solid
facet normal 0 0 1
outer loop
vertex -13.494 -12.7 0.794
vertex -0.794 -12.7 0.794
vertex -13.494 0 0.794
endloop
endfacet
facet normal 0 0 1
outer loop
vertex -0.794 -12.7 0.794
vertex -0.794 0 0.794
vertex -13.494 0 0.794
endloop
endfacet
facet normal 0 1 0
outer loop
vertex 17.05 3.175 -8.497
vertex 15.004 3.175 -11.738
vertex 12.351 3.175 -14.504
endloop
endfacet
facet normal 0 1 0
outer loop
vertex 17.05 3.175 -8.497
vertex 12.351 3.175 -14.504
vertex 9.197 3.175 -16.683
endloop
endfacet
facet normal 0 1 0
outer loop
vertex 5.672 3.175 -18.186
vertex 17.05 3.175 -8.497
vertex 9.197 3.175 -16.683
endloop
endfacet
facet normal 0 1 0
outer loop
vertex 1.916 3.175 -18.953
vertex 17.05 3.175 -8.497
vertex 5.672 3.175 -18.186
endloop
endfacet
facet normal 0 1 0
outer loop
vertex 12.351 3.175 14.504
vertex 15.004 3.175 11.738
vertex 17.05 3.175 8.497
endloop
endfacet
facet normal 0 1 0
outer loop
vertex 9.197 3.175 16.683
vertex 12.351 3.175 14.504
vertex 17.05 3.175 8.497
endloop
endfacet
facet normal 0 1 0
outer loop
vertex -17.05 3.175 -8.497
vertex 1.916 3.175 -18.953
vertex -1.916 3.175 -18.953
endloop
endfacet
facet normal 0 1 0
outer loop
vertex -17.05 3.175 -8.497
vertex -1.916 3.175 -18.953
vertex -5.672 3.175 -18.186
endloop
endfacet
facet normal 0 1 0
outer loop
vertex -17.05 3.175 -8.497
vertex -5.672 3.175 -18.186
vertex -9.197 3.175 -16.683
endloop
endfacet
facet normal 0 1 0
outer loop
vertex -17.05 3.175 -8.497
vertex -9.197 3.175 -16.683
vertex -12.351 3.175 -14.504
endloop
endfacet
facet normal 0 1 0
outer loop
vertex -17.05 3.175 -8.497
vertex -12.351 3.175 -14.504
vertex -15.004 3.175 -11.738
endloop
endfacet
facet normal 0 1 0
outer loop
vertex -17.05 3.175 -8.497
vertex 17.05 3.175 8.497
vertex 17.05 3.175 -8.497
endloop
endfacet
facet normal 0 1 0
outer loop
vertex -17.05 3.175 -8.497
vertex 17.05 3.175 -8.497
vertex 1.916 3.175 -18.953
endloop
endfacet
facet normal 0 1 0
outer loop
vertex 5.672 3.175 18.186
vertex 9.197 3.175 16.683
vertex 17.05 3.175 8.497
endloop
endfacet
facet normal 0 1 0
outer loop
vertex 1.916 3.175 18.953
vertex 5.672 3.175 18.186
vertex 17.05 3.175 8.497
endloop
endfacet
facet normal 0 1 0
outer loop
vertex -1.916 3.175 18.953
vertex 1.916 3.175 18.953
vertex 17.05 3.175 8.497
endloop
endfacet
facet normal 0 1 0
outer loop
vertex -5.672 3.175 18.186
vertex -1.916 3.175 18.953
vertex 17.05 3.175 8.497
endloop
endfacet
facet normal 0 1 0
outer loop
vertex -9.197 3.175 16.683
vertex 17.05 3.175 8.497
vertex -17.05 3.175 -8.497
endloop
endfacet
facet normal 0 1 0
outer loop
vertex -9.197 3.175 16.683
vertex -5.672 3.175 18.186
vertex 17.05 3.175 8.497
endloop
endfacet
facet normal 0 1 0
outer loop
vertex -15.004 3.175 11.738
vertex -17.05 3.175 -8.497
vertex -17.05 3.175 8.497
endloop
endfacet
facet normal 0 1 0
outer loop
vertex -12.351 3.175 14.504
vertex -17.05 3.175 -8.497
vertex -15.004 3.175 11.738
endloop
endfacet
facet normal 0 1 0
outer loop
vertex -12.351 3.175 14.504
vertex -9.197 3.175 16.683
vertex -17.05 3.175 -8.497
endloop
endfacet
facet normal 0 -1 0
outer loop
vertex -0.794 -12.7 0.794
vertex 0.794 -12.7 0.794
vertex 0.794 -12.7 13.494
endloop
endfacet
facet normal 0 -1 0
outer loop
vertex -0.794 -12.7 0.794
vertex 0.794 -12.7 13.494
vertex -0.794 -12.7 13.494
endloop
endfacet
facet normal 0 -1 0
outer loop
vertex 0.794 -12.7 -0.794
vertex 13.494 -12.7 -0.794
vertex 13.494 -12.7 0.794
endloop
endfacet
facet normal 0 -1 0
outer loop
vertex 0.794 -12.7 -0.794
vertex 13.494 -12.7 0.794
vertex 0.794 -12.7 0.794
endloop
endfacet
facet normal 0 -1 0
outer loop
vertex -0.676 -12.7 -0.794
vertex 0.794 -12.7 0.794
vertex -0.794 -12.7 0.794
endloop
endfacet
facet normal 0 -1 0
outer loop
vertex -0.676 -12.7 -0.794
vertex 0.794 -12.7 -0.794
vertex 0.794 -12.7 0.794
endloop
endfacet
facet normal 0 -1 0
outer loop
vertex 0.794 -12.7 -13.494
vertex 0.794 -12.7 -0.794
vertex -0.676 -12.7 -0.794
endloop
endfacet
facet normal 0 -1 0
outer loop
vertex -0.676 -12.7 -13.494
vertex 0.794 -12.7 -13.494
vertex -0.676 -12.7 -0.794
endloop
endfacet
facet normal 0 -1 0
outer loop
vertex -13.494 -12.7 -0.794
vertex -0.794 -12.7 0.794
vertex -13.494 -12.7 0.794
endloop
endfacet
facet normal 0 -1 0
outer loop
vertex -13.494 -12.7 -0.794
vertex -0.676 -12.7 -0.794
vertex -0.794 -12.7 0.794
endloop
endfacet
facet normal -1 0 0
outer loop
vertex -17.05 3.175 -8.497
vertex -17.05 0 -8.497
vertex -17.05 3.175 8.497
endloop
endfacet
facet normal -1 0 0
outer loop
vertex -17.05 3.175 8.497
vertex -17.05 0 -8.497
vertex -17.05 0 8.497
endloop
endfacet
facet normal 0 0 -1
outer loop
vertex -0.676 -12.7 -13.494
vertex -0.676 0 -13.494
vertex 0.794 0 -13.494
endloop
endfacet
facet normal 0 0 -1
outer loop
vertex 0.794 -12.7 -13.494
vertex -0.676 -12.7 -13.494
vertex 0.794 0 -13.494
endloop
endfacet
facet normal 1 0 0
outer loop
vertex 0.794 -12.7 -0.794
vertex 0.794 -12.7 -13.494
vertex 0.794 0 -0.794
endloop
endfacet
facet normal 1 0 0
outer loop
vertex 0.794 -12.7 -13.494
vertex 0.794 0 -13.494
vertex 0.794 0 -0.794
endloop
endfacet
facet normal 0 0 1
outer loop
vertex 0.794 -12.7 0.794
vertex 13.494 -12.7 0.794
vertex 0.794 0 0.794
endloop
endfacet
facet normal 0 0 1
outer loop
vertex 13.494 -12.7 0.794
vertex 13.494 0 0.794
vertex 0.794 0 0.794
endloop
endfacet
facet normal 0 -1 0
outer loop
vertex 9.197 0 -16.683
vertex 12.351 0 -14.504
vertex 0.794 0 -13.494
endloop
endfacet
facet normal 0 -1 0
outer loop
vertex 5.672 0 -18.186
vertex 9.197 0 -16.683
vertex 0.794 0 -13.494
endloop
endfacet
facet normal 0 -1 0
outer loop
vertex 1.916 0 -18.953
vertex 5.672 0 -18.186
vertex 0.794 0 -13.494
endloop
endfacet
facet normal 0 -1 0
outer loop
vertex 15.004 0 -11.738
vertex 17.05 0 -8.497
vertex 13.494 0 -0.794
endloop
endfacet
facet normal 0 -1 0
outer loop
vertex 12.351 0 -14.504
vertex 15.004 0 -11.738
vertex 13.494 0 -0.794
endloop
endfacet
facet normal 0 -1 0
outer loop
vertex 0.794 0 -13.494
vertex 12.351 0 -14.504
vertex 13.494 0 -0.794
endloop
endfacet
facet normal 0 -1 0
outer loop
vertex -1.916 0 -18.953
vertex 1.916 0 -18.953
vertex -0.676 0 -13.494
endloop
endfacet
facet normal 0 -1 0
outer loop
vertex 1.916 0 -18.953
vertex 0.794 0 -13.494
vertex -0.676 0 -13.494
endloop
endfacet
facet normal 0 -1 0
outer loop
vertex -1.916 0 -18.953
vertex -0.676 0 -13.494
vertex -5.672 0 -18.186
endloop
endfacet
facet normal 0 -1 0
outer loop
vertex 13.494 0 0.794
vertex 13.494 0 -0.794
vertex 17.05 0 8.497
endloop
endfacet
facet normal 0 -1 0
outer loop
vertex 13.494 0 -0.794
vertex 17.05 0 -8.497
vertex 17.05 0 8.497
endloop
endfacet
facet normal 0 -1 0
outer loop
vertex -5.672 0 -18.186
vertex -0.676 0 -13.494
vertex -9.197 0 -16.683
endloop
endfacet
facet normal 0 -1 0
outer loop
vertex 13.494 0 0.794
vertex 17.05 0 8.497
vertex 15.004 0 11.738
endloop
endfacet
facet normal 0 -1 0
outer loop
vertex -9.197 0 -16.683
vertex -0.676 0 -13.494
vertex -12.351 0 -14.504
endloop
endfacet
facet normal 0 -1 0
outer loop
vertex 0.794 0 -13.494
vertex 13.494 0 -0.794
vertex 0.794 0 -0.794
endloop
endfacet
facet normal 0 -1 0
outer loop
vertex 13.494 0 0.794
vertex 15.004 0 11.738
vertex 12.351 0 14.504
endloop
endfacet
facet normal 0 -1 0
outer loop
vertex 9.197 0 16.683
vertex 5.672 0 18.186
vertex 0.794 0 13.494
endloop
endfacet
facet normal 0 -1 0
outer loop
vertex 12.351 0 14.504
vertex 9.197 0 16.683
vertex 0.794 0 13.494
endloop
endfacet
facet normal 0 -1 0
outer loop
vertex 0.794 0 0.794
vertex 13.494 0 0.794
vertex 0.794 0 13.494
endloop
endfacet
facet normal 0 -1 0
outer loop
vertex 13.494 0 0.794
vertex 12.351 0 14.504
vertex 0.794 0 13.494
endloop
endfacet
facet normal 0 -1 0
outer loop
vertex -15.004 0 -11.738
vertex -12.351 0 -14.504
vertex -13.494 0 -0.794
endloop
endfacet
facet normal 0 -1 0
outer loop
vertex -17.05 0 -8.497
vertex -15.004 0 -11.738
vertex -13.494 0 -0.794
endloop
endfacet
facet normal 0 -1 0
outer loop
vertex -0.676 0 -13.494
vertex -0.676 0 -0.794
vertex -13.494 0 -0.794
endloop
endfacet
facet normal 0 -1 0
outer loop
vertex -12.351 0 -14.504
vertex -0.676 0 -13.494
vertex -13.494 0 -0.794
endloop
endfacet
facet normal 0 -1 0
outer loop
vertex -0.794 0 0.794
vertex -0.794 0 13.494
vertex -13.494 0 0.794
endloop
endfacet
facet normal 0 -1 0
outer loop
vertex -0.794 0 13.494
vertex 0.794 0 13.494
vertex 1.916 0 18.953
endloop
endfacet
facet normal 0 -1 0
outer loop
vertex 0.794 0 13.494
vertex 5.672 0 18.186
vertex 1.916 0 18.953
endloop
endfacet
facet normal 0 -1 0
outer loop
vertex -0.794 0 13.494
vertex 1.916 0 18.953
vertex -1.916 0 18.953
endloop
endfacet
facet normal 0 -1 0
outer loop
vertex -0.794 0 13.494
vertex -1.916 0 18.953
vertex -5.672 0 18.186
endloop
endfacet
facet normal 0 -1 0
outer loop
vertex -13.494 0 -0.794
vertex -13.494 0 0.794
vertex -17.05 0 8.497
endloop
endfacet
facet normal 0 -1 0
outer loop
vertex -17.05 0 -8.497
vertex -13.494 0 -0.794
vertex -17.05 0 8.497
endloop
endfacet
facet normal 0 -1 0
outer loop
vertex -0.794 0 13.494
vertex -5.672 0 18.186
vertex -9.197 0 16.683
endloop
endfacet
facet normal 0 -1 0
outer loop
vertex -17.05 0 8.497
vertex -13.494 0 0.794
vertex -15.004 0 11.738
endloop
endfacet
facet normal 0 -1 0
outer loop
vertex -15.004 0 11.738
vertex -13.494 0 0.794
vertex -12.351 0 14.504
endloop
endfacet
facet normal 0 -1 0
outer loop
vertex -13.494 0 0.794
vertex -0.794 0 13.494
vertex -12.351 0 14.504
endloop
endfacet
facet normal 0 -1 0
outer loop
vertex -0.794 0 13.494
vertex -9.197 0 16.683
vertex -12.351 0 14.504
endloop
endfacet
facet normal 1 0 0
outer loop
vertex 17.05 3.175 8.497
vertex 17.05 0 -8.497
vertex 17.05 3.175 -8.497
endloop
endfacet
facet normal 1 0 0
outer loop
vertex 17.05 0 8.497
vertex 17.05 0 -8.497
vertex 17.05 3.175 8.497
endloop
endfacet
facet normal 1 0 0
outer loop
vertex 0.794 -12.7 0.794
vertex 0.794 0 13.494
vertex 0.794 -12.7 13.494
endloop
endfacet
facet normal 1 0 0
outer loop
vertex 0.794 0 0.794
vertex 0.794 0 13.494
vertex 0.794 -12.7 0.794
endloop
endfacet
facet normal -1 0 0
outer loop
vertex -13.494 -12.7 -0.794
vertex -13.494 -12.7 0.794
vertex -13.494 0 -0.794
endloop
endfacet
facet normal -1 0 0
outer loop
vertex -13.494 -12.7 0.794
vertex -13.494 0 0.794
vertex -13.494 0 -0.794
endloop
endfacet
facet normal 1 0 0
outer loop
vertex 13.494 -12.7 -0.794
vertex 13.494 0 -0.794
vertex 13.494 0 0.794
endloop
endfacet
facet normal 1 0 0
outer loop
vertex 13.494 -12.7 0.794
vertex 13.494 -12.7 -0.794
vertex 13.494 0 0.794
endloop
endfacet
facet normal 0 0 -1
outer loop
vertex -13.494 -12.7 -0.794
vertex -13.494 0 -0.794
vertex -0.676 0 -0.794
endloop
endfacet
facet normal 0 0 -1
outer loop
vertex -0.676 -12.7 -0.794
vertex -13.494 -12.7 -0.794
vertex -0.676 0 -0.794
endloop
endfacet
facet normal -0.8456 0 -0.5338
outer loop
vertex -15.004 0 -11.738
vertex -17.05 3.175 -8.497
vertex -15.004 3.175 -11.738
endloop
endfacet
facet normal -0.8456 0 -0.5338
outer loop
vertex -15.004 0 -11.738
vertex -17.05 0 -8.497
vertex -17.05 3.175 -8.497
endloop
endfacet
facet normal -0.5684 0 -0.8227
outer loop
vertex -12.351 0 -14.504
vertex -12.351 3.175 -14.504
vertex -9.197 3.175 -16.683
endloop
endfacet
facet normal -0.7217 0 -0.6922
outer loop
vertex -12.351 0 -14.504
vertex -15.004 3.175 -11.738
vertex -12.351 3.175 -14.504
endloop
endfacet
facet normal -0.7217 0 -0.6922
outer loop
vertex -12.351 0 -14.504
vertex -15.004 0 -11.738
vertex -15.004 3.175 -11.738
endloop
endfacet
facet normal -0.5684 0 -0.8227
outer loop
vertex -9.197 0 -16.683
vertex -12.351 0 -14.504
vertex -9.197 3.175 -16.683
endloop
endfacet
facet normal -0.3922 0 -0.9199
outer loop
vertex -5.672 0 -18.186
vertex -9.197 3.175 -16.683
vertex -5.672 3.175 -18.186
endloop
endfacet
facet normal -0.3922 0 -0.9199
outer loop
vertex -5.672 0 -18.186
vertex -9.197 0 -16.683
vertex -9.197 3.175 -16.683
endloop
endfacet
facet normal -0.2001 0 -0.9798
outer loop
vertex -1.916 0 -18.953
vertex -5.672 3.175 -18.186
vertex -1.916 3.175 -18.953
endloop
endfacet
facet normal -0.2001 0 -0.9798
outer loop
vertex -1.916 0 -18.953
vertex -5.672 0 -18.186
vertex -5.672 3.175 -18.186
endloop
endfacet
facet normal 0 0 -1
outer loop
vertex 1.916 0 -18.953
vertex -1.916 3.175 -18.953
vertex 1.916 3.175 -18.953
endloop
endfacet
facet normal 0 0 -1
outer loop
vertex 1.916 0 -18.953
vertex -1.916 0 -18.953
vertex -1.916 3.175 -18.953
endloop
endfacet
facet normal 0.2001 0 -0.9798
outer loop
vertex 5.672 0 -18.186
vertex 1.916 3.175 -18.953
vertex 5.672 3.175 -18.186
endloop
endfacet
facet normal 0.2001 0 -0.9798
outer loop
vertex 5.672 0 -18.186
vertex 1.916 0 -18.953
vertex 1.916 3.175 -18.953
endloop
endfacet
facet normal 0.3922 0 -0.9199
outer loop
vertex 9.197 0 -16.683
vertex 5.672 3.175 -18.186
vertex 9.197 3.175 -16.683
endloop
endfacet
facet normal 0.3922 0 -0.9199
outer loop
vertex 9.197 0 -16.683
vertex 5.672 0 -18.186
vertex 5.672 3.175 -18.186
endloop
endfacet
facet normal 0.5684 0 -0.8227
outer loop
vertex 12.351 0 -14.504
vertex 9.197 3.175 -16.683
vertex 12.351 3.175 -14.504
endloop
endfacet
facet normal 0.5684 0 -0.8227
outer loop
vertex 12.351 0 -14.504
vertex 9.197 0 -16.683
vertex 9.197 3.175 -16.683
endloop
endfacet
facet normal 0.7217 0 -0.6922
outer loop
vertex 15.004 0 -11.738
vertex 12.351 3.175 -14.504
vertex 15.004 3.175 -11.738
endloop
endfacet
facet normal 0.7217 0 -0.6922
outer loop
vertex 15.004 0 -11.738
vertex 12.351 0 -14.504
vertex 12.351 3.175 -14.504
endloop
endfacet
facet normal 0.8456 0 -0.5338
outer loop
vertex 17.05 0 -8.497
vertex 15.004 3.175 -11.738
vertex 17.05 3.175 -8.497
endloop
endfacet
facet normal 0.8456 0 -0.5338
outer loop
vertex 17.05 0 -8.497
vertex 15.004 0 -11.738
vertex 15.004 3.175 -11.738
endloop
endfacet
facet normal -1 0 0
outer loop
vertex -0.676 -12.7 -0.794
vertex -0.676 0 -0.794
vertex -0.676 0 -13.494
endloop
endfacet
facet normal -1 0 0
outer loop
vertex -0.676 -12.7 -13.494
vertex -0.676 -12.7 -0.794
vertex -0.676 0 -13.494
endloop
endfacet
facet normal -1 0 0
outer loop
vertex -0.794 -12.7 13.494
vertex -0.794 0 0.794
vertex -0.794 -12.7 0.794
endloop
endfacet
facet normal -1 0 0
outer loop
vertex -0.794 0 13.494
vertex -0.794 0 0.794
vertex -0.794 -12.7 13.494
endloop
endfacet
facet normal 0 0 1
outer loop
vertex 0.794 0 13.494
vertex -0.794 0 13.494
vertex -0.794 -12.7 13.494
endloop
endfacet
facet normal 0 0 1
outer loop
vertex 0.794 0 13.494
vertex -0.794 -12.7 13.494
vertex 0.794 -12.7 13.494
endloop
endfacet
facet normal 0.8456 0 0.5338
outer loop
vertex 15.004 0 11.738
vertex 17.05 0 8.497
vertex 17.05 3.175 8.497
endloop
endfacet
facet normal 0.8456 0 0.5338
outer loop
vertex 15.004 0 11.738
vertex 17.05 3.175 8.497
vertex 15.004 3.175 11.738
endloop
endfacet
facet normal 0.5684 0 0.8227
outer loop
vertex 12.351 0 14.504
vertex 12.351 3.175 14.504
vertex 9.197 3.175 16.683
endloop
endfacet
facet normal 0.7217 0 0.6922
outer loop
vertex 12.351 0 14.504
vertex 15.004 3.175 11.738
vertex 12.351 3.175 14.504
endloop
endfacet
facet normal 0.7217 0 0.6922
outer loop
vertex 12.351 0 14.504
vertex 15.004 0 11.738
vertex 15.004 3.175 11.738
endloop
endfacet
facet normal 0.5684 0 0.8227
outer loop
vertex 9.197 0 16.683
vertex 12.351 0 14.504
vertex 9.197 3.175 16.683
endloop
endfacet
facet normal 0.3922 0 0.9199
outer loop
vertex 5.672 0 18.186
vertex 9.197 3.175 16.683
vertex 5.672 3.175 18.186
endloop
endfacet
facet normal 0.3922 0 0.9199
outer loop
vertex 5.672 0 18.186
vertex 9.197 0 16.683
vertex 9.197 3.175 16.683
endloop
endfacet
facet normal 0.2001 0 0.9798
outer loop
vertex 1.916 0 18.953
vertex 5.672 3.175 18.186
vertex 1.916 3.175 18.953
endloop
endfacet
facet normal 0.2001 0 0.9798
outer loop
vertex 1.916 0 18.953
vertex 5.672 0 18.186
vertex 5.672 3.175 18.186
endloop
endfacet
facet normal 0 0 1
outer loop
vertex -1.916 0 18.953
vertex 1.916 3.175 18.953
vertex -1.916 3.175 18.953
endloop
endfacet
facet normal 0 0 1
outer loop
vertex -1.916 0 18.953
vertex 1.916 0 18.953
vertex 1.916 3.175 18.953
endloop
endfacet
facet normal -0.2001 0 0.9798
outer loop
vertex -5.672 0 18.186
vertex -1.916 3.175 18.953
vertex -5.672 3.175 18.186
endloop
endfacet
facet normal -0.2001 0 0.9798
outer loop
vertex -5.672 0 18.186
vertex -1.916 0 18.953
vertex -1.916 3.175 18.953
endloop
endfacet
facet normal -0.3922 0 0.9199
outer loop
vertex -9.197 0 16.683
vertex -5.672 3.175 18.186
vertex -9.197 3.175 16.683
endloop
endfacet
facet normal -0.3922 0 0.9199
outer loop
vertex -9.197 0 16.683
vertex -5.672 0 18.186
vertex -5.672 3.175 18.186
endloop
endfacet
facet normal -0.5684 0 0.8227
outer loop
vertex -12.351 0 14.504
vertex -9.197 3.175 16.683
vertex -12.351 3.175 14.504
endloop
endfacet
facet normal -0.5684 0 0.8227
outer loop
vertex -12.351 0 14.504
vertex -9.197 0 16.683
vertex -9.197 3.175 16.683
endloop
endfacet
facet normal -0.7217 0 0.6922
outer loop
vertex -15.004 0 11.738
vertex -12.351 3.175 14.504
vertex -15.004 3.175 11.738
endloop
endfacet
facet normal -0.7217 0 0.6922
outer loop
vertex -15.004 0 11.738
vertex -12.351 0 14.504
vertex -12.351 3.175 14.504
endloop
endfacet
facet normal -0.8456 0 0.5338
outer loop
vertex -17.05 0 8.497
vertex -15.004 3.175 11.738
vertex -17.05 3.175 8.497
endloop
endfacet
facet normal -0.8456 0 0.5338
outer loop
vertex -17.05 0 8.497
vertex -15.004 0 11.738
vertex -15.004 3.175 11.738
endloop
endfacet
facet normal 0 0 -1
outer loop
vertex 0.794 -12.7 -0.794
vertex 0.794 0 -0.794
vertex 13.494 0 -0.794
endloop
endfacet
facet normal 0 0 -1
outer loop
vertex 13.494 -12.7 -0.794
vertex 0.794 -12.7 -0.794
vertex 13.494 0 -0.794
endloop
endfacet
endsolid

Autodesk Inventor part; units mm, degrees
ref_plane "YZ Plane" through (0, 0, 0) normal (1, 0, 0) x (0, 1, 0)
ref_plane "XZ Plane" through (0, 0, 0) normal (0, 1, 0) x (-1, 0, 0)
ref_plane "XY Plane" through (0, 0, 0) normal (0, 0, 1) x (1, 0, 0)
sketch "Sketch1" plane through (0, 0, 0) normal (0, 1, 0) x (-1, 0, 0)
  line L0 (-17.05, 0) -> (-17.05, 8.4971)
  line L1 (-17.05, 0) -> (-17.05, -8.4971)
  line L2 (17.05, 0) -> (17.05, 8.4971)
  line L3 (17.05, 0) -> (17.05, -8.4971)
  arc A0 (-17.05, -8.4971) -> (17.05, -8.4971) centre (0, 0) ccw
  arc A1 (17.05, 8.4971) -> (-17.05, 8.4971) centre (0, 0) ccw
extrude "Extrusion1" add sketch "Sketch1" along normal blind 3.175
sketch "Sketch4" plane through (0, 0, 0) normal (0, -1, 0) x (-1, 0, 0)
  line L0 (-13.4937, -0.7938) -> (13.4938, -0.7938)
  line L1 (13.4938, -0.7938) -> (13.4938, 0.7938)
  line L2 (13.4938, 0.7938) -> (-13.4938, 0.7937)
  line L3 (-13.4938, 0.7937) -> (-13.4937, -0.7938)
  circle A0 centre (0, 0) radius 19.05 projected
  dimension "d16" = 26.9875
  dimension "d17" = 1.5875
  dimension "d18" = 18.2563
  dimension "d19" = 5.5563
extrude "Extrusion3" add sketch "Sketch4" along normal blind 12.7 contours L3 L2 L1 L0
sketch "Sketch5" plane through (0, 0, 0) normal (0, -1, 0) x (-1, 0, 0)
  line L0 (13.4937, 0.7938) -> (-13.4938, 0.7937) projected
  line L1 (-0.7938, 0.7937) -> (0.6758, 0.7937)
  line L2 (0.6758, 0.7937) -> (0.6758, 13.4938)
  line L3 (0.6758, 13.4938) -> (-0.7938, 13.4938)
  line L4 (-0.7938, 13.4938) -> (-0.7938, 0.7937)
  line L5 (-13.4938, 0.7937) -> (-13.4937, -0.7938) projected
  point P0 (0, 0)
  dimension "d22" = 12.7
  dimension "d23" = 12.7
extrude "Extrusion4" add sketch "Sketch5" along normal blind 12.7
sketch "Sketch7" plane through (0, 0, 0) normal (0, -1, 0) x (-1, 0, 0)
  line L0 (-13.4937, -0.7938) -> (13.4937, -0.7938) projected
  line L1 (-0.7938, -0.7938) -> (0.7937, -0.7938)
  line L2 (0.7937, -0.7938) -> (0.7937, -13.4938)
  line L3 (0.7937, -13.4938) -> (-0.7938, -13.4938)
  line L4 (-0.7938, -13.4938) -> (-0.7938, -0.7938)
  line L5 (13.4937, -0.7938) -> (13.4937, 0.7938) projected
  point P0 (0, 0)
  dimension "d28" = 12.7
  dimension "d29" = 1.5875
  dimension "d30" = 12.7
extrude "Extrusion5" add sketch "Sketch7" along normal blind 12.7
properties part number "Syringe cap_Flat_Sides"
